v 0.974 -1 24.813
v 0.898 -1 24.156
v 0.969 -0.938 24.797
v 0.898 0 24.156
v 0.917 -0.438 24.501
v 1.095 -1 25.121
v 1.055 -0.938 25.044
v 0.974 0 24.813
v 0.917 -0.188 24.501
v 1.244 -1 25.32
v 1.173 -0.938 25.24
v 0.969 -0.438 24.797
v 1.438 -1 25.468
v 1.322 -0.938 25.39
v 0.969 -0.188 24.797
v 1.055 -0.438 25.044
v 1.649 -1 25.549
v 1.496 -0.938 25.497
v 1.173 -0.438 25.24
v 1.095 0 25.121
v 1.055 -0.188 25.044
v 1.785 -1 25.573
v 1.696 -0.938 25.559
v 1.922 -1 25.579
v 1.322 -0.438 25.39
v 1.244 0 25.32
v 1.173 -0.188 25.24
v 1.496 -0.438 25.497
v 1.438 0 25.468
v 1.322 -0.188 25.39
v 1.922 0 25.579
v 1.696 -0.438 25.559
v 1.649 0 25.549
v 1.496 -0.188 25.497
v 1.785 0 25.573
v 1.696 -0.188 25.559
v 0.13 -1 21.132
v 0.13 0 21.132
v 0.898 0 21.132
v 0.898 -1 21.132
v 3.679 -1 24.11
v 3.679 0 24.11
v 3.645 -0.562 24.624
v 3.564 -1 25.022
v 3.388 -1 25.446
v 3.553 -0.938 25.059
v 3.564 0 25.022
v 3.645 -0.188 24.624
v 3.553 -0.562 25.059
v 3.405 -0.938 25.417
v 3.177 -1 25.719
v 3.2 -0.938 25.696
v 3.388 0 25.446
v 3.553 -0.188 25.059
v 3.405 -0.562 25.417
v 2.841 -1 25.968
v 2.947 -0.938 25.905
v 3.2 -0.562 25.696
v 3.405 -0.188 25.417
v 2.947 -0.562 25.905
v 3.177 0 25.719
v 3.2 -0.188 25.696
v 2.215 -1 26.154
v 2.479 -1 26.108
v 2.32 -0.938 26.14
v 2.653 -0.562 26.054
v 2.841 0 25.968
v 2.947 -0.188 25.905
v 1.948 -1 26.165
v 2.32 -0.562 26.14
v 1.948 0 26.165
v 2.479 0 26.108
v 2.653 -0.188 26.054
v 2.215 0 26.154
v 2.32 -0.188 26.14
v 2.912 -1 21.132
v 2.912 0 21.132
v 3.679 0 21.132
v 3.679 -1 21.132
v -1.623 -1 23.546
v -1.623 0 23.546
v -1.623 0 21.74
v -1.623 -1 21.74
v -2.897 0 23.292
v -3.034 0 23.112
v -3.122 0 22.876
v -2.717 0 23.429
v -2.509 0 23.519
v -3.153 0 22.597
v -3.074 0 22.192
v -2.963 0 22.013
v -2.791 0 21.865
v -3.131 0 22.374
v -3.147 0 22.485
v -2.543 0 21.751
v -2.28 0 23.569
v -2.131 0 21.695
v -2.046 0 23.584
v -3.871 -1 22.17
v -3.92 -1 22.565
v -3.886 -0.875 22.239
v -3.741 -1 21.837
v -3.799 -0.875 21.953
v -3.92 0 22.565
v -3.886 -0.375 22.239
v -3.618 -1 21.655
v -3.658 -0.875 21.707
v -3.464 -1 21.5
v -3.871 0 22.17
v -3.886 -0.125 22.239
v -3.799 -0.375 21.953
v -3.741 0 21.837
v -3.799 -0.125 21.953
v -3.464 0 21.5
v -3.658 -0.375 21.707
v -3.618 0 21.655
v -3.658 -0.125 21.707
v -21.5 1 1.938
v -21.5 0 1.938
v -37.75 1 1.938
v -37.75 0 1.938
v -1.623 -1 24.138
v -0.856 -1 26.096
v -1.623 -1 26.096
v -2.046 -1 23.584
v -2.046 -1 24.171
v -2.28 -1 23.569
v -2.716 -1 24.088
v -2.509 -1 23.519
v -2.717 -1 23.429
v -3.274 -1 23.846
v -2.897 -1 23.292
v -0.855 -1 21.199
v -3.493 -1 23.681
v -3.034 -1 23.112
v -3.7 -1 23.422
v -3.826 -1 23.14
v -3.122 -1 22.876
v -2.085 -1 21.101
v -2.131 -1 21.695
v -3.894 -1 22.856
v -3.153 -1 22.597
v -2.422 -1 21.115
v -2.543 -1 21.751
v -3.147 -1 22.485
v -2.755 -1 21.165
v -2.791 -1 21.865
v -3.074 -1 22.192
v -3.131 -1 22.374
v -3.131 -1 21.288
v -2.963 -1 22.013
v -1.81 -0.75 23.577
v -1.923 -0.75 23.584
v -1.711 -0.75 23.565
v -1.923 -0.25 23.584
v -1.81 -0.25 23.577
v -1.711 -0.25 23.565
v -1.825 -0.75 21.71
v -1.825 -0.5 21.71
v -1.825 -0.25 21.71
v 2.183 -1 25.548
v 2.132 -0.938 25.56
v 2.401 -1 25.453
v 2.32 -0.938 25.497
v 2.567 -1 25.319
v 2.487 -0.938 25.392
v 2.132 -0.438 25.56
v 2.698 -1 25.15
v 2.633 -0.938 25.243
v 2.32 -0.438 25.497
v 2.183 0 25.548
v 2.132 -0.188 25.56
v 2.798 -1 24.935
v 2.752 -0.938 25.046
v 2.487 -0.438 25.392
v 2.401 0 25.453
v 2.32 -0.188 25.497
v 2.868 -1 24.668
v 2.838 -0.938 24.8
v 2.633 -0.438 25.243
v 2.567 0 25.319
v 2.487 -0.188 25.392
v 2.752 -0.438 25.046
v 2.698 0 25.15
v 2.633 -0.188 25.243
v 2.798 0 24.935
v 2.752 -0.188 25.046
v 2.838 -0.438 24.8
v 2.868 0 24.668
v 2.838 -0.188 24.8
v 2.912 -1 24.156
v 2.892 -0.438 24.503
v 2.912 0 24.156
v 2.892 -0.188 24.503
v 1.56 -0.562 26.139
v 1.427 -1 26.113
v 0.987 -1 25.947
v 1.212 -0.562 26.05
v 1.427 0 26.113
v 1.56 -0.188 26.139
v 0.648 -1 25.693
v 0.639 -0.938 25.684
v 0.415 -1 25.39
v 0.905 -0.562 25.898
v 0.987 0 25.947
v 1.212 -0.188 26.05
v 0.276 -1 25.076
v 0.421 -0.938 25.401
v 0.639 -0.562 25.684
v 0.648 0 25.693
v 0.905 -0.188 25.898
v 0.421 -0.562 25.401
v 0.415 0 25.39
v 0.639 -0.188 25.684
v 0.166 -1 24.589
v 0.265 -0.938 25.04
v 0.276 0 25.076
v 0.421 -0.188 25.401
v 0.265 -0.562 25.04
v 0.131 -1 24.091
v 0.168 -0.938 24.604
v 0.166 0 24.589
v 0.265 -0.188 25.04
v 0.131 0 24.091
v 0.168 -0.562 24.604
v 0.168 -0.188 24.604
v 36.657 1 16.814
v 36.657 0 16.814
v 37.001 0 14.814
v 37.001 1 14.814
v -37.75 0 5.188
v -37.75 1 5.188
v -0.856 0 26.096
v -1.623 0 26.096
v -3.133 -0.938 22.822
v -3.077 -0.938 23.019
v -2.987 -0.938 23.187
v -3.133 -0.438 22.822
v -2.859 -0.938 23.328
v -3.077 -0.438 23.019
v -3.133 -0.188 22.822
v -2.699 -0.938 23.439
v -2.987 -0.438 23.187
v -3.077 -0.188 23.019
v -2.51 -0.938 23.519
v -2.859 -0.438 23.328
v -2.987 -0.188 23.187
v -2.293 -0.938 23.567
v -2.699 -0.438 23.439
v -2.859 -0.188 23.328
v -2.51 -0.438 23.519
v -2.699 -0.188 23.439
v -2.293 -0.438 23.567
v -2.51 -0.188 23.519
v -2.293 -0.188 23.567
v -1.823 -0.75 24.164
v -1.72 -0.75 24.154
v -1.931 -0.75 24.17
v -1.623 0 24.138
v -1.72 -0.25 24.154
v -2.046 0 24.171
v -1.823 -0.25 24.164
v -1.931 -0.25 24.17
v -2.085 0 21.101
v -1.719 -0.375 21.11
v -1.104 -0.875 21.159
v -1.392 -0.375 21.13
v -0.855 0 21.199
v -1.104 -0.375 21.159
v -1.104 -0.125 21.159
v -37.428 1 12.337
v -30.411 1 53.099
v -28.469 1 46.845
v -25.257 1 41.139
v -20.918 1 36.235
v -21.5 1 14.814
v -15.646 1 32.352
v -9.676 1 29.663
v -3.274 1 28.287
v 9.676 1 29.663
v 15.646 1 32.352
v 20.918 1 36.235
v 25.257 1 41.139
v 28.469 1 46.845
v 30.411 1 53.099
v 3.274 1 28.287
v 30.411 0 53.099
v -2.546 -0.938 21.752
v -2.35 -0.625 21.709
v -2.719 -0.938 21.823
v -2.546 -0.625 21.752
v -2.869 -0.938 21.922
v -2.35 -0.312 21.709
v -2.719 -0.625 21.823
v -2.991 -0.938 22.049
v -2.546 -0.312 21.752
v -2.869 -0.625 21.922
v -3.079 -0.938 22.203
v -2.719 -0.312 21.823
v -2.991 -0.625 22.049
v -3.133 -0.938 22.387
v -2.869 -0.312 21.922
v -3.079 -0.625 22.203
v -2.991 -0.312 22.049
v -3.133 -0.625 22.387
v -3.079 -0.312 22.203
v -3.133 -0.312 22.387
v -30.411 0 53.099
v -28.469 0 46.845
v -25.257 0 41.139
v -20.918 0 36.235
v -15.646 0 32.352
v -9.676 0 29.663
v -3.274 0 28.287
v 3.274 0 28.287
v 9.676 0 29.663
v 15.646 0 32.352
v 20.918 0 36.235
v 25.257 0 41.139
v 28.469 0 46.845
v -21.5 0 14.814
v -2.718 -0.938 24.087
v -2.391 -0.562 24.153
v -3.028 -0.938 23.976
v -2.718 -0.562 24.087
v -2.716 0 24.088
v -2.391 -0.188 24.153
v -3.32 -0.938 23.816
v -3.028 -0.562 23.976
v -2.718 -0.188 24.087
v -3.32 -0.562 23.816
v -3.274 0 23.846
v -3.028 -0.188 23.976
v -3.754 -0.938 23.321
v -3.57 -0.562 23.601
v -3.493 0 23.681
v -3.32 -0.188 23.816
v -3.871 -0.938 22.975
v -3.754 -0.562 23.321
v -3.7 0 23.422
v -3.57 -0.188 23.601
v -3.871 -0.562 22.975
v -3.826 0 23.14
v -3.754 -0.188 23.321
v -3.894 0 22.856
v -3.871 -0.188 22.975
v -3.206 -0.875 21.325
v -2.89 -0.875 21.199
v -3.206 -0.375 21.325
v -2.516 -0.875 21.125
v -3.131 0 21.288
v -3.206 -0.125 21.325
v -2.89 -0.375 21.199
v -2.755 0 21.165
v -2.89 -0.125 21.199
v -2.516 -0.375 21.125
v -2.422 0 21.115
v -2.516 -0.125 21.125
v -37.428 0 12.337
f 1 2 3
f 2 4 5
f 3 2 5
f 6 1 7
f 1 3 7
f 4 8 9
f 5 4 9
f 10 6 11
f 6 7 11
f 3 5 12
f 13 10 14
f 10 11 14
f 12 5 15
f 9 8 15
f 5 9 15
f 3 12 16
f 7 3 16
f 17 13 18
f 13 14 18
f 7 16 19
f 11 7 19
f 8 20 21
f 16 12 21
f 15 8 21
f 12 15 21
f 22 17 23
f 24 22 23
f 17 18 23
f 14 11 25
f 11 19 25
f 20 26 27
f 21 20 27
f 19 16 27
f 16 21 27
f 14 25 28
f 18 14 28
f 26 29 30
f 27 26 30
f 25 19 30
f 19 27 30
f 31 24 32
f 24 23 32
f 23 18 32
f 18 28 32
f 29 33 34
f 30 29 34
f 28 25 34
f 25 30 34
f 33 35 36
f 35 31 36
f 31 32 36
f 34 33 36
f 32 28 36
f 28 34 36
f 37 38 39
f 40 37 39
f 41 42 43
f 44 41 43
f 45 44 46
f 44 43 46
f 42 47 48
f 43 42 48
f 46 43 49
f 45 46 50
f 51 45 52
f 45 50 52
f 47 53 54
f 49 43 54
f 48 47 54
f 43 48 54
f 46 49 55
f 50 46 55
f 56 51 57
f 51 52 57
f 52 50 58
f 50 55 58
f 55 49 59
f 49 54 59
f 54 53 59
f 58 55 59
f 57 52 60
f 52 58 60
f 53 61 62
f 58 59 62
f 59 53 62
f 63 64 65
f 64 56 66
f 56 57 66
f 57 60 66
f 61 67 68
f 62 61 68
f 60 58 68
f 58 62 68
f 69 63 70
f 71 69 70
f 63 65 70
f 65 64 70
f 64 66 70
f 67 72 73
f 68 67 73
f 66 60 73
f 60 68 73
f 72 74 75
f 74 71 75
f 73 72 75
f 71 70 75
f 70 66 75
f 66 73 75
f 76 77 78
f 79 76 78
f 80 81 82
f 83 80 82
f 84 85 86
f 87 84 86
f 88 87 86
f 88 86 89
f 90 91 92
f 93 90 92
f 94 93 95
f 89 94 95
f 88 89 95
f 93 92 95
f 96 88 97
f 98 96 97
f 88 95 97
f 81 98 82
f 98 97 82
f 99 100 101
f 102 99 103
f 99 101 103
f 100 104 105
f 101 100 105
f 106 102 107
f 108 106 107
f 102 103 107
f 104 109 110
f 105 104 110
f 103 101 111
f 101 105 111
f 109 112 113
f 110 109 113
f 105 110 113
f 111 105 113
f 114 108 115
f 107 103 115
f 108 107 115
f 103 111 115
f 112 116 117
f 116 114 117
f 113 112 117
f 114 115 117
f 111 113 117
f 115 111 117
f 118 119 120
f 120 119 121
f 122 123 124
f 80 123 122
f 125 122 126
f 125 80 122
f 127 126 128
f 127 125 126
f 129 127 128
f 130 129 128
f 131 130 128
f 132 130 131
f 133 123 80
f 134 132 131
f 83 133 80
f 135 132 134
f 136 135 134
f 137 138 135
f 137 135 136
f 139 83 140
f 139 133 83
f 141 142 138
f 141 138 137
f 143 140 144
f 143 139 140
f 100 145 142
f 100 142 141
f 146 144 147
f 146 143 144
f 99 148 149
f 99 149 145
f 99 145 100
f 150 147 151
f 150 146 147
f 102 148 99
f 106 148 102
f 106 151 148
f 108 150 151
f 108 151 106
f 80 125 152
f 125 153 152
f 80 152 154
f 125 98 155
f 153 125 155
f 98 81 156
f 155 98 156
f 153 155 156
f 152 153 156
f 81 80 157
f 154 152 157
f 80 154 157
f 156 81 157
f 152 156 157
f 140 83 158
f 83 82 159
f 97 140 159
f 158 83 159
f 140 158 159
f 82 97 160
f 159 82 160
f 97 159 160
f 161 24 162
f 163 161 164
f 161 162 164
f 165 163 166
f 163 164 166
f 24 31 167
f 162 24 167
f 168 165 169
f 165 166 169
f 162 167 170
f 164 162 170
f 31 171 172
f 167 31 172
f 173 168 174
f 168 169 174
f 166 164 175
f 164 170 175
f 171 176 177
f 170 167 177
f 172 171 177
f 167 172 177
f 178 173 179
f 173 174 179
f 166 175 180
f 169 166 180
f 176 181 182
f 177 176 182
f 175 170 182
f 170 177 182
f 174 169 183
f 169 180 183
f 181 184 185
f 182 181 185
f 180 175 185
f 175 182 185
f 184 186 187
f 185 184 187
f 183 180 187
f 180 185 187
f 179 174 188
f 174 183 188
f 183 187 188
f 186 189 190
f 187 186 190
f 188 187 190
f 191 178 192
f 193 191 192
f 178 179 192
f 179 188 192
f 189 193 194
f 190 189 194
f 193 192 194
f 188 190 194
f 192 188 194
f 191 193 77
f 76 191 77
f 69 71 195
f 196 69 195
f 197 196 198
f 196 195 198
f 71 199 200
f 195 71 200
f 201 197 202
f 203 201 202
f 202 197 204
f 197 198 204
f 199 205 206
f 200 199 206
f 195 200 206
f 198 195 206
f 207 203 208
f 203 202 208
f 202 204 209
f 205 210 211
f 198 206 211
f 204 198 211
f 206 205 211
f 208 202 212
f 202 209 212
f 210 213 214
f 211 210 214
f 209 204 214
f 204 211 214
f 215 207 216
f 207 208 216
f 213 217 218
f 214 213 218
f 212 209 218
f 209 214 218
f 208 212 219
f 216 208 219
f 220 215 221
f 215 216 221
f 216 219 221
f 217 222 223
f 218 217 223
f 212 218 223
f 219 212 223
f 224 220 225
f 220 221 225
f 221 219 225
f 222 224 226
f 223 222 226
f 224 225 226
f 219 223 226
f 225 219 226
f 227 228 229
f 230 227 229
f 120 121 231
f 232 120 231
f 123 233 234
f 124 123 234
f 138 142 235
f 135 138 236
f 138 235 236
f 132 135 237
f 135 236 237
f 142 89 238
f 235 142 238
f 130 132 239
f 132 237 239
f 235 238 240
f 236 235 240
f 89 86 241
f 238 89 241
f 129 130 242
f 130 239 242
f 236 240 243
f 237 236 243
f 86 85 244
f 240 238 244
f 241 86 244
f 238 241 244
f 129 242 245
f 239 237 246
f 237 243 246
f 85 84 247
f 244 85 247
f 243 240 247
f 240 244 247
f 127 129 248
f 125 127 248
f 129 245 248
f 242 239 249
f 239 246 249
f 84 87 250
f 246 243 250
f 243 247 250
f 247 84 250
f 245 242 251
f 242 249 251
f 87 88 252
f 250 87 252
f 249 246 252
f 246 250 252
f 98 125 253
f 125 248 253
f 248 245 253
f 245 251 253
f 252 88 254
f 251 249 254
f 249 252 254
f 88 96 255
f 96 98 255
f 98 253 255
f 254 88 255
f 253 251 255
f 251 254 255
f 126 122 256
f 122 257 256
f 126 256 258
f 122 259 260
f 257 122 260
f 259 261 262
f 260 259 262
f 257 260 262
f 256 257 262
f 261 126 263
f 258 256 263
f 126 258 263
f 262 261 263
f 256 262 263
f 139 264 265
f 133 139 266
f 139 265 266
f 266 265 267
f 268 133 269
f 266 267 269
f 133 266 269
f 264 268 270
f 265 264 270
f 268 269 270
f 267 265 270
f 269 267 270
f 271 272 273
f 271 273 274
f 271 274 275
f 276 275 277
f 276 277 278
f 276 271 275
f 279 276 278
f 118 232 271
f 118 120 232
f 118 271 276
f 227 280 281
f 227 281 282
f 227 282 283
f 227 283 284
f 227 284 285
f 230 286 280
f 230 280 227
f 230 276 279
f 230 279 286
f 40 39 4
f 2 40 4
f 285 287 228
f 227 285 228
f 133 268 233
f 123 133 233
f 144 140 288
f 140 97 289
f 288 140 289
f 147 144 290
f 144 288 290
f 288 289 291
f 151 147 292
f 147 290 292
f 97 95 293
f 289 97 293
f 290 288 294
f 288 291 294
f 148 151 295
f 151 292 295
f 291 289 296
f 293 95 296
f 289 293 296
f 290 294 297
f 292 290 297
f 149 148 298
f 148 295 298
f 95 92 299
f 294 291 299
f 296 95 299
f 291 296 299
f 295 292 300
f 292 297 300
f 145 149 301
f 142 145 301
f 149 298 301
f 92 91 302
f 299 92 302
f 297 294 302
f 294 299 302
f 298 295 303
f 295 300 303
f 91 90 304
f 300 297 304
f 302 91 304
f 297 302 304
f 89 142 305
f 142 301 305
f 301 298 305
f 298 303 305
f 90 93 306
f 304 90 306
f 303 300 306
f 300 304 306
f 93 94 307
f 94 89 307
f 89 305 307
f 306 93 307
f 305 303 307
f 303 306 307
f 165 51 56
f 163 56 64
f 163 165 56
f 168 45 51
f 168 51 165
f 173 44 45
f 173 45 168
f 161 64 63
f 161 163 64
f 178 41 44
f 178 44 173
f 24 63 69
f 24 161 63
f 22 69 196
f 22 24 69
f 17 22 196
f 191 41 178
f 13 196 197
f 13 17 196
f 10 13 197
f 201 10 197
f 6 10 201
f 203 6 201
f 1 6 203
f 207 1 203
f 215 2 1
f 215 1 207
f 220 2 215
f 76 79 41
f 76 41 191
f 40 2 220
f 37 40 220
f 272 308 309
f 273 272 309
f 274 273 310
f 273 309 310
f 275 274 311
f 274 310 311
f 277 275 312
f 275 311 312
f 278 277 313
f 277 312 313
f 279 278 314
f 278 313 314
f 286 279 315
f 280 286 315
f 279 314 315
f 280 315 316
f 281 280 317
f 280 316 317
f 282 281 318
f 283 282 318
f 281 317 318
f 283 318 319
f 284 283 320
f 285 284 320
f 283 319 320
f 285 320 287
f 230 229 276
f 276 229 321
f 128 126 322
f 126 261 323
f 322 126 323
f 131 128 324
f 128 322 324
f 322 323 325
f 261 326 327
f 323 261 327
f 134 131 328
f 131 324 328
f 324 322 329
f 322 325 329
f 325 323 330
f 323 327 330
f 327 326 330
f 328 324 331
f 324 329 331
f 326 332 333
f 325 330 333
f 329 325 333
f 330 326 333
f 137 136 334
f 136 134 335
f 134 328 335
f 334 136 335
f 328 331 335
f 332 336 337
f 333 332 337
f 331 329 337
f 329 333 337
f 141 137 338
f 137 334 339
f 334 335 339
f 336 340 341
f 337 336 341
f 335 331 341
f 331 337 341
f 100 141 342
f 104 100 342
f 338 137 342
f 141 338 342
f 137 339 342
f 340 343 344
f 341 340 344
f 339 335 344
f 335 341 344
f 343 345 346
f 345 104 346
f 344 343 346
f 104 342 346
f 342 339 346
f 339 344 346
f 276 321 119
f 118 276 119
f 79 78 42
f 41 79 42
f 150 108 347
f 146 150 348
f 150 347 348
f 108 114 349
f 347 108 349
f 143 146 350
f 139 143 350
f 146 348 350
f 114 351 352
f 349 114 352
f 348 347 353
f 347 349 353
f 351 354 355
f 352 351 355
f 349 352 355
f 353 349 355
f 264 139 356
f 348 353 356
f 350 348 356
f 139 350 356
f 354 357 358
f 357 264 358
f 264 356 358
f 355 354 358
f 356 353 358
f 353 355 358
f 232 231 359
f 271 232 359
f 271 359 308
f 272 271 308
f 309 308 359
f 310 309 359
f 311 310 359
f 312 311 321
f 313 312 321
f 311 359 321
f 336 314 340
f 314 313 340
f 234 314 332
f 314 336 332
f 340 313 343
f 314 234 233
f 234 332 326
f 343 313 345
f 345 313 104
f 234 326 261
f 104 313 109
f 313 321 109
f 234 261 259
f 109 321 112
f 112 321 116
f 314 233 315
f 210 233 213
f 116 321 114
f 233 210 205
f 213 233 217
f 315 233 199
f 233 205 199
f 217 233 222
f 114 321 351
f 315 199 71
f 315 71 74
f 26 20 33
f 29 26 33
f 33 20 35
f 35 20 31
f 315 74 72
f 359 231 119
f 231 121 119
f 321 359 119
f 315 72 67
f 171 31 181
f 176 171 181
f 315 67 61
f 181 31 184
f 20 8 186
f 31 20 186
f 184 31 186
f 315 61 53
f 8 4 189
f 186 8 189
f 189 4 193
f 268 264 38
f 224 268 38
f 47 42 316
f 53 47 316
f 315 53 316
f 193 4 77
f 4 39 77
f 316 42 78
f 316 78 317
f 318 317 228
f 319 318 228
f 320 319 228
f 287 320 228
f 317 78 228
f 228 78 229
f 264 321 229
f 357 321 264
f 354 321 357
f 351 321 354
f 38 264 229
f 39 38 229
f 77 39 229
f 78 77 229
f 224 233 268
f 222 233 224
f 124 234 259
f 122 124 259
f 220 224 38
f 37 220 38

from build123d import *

# Parameters (mm, degrees)
EXTRUDE_1_DEPTH = 1
EXTRUDE_2_DEPTH = 1


with BuildPart() as part:
    # 草图2 → 凸台-拉伸1 (new body)
    with BuildSketch(Plane(origin=(0, 0, 0), x_dir=(1, 0, 0), z_dir=(0, 1, 0))):
        with BuildLine():
            Line((-37.75, -5.187524662), (-37.427791342, -12.336938121))
            Line((-37.427791342, -12.336938121), (-30.410766277, -53.09868086))
            ThreePointArc((-30.410766277, -53.09868086), (0, -28.114102247), (30.410766277, -53.09868086))
            Line((30.410766277, -53.09868086), (36.657098941, -16.813873157))
            Line((36.657098941, -16.813873157), (37.001393596, -14.813873158))
            Line((37.001393596, -14.813873158), (-21.5, -14.813873158))
            Line((-21.5, -14.813873158), (-21.5, -1.937524662))
            Line((-21.5, -1.937524662), (-37.75, -1.937524662))
            Line((-37.75, -1.937524662), (-37.75, -5.187524662))
        make_face()
    extrude(amount=EXTRUDE_1_DEPTH)

    # 草图3 → 凸台-拉伸2 (add)
    # profile 1 of 2: a face of its own
    with BuildSketch(Plane(origin=(0, 0, 0), x_dir=(1, 0, 0), z_dir=(0, 1, 0))):
        with BuildLine():
            Line((-0.856008306, -26.09621982), (-1.623205137, -26.09621982))
            Line((-1.623205137, -26.09621982), (-1.623205137, -24.137821353))
            add(Edge.make_bspline(
                [(-1.623205137, -24.137821353), (-1.655268125, -24.143514077), (-1.721316296, -24.155240806), (-1.824283839, -24.164783502), (-1.933346323, -24.17076586), (-2.008053511, -24.170657837), (-2.046485638, -24.170602266)],
                knots=[0, 0, 0, 0, 0.918585764, 1.892241272, 2.915691322, 4, 4, 4, 4], degree=3))
            add(Edge.make_bspline(
                [(-2.046485638, -24.170602266), (-2.104785366, -24.170571941), (-2.220025321, -24.170511997), (-2.390487029, -24.154509017), (-2.556692953, -24.12850453), (-2.718324735, -24.089526065), (-2.87582336, -24.039158247), (-3.029314168, -23.977977332), (-3.17798521, -23.903769977), (-3.321131503, -23.818737452), (-3.455836859, -23.720606314), (-3.573248856, -23.603221137), (-3.675029776, -23.4704659), (-3.7579419, -23.320396932), (-3.825592093, -23.154649423), (-3.874729538, -22.972446384), (-3.908442208, -22.774352183), (-3.916101546, -22.636664835), (-3.920068751, -22.565348758)],
                knots=[0, 0, 0, 0, 1.003522523, 1.98364375, 2.944869411, 3.898614004, 4.843729631, 5.790462383, 6.741287792, 7.702146141, 8.655643954, 9.602935836, 10.551034771, 11.527201242, 12.5464735, 13.626777097, 14.770773406, 16, 16, 16, 16], degree=3))
            add(Edge.make_bspline(
                [(-3.920068751, -22.565348758), (-3.917621314, -22.509206105), (-3.912856522, -22.399904758), (-3.888966748, -22.241365875), (-3.851887205, -22.092719231), (-3.802758946, -21.953287322), (-3.736987826, -21.824826369), (-3.660822021, -21.704776101), (-3.569736975, -21.595056691), (-3.499181783, -21.53152241), (-3.46371946, -21.499588924)],
                knots=[0, 0, 0, 0, 1.126595518, 2.193312949, 3.209115705, 4.196248007, 5.151139266, 6.097382339, 7.043709754, 8, 8, 8, 8], degree=3))
            add(Edge.make_bspline(
                [(-3.46371946, -21.499588924), (-3.423819299, -21.467392586), (-3.342763644, -21.401986955), (-3.204758648, -21.32105817), (-3.053205789, -21.252406965), (-2.887562725, -21.19534799), (-2.707183639, -21.152151647), (-2.5123955, -21.123211501), (-2.303575344, -21.103250861), (-2.159600384, -21.101683502), (-2.085223363, -21.100873809)],
                knots=[0, 0, 0, 0, 0.838628006, 1.70364077, 2.610636308, 3.559859354, 4.568055018, 5.643200099, 6.782484425, 8, 8, 8, 8], degree=3))
            add(Edge.make_bspline(
                [(-2.085223363, -21.100873809), (-2.022547246, -21.101999243), (-1.900326605, -21.10419388), (-1.722031706, -21.10963235), (-1.553493577, -21.11799829), (-1.394779498, -21.129605553), (-1.245704987, -21.14233845), (-1.106447222, -21.158428618), (-0.977269579, -21.177092329), (-0.894709866, -21.191984217), (-0.855064406, -21.199135354)],
                knots=[0, 0, 0, 0, 1.217605855, 2.374374404, 3.464660226, 4.494999595, 5.465333604, 6.370582827, 7.217548217, 8, 8, 8, 8], degree=3))
            Line((-0.855064406, -21.199135354), (-0.856008306, -26.09621982))
        make_face()
        with BuildLine():
            add(Edge.make_bspline(
                [(-1.623205137, -21.739832201), (-1.65274721, -21.733999838), (-1.719633086, -21.720794849), (-1.833986924, -21.708704947), (-1.973601931, -21.699443395), (-2.075441396, -21.696669118), (-2.130574845, -21.695167191)],
                knots=[0, 0, 0, 0, 0.708180311, 1.603383121, 2.702528978, 4, 4, 4, 4], degree=3))
            add(Edge.make_bspline(
                [(-2.130574845, -21.695167191), (-2.168073561, -21.695952692), (-2.24132842, -21.697487191), (-2.348460101, -21.707705221), (-2.449759776, -21.725860501), (-2.54572877, -21.750031884), (-2.635478405, -21.782226009), (-2.71969003, -21.821293247), (-2.797963445, -21.867371353), (-2.870093205, -21.92060581), (-2.935949572, -21.979929245), (-2.993080877, -22.047665882), (-3.041017981, -22.122592696), (-3.081384443, -22.203868683), (-3.112473184, -22.292435582), (-3.13480904, -22.388111375), (-3.14923784, -22.490598656), (-3.151639324, -22.56120559), (-3.152872842, -22.597472724)],
                knots=[0, 0, 0, 0, 1.164286524, 2.274468469, 3.33712435, 4.356941393, 5.343590938, 6.292901648, 7.23538906, 8.158502959, 9.072142365, 9.981112688, 10.900594105, 11.827687296, 12.792632354, 13.80775062, 14.873954761, 16, 16, 16, 16], degree=3))
            add(Edge.make_bspline(
                [(-3.152872842, -22.597472724), (-3.151613433, -22.636249876), (-3.149167963, -22.711545774), (-3.13519411, -22.82079109), (-3.111174009, -22.922850983), (-3.079419521, -23.018294919), (-3.038824966, -23.107069292), (-2.988156623, -23.188218343), (-2.928144539, -23.262075146), (-2.860007553, -23.329662929), (-2.783057089, -23.388781734), (-2.699594044, -23.441477416), (-2.608012254, -23.4847832), (-2.509562282, -23.520465241), (-2.404100063, -23.54918737), (-2.291122917, -23.56840422), (-2.171164858, -23.580930403), (-2.088720416, -23.582872542), (-2.046485638, -23.583867464)],
                knots=[0, 0, 0, 0, 1.10647952, 2.148516939, 3.135813804, 4.093347323, 5.013956832, 5.913991464, 6.814877829, 7.723438285, 8.645449828, 9.577866136, 10.534345172, 11.529217628, 12.562346088, 13.648092354, 14.795160789, 16, 16, 16, 16], degree=3))
            add(Edge.make_bspline(
                [(-2.046485638, -23.583867464), (-2.00521482, -23.584412899), (-1.926388911, -23.585454662), (-1.814442024, -23.578443617), (-1.714043734, -23.567445346), (-1.652392814, -23.552941286), (-1.623205137, -23.546074562)],
                knots=[0, 0, 0, 0, 1.161518353, 2.218461969, 3.156558288, 4, 4, 4, 4], degree=3))
            Line((-1.623205137, -23.546074562), (-1.623205137, -21.739832201))
        make_face(mode=Mode.SUBTRACT)
    # profile 2 of 2: a face of its own
    with BuildSketch(Plane(origin=(0, 0, 0), x_dir=(1, 0, 0), z_dir=(0, 1, 0))):
        with BuildLine():
            Line((0.130386434, -21.131914551), (0.897583266, -21.131914551))
            Line((0.897583266, -21.131914551), (0.897583266, -24.155636425))
            add(Edge.make_bspline(
                [(0.897583266, -24.155636425), (0.89929321, -24.215445763), (0.902592367, -24.33084157), (0.915368258, -24.497724176), (0.936829282, -24.652102877), (0.966769663, -24.79430293), (1.005239493, -24.924351911), (1.052260261, -25.041802473), (1.107369405, -25.147128319), (1.170551424, -25.240289062), (1.242373791, -25.321087274), (1.319851887, -25.391822873), (1.404784791, -25.450371121), (1.495300915, -25.499626189), (1.593035117, -25.536183316), (1.69708966, -25.5615439), (1.807291946, -25.577012589), (1.882979468, -25.57854654), (1.921769062, -25.579332685)],
                knots=[0, 0, 0, 0, 1.442558911, 2.783265207, 4.033293762, 5.19797452, 6.283894868, 7.299176403, 8.243481286, 9.144954945, 10.005756174, 10.844503658, 11.66816234, 12.486940923, 13.323278702, 14.176003432, 15.065208066, 16, 16, 16, 16], degree=3))
            add(Edge.make_bspline(
                [(1.921769062, -25.579332685), (1.957725333, -25.578915325), (2.028096046, -25.578098501), (2.130909973, -25.562628358), (2.228129718, -25.535898617), (2.320368479, -25.498795392), (2.40757394, -25.451723675), (2.488940384, -25.393059054), (2.564744704, -25.323401018), (2.635860422, -25.243242907), (2.699760366, -25.150387865), (2.755013907, -25.045271413), (2.802850288, -24.927654795), (2.840414423, -24.797263515), (2.872028446, -24.654713055), (2.894014576, -24.499623904), (2.908368244, -24.332115662), (2.910724859, -24.216299952), (2.911943092, -24.156429928)],
                knots=[0, 0, 0, 0, 0.880869997, 1.723967724, 2.54076827, 3.348096003, 4.15667844, 4.964596865, 5.80091263, 6.676282017, 7.586647838, 8.557371955, 9.582678263, 10.694376867, 11.880403812, 13.160330013, 14.532054847, 16, 16, 16, 16], degree=3))
            Line((2.911943092, -24.156429928), (2.911943092, -21.131914551))
            Line((2.911943092, -21.131914551), (3.679139924, -21.131914551))
            Line((3.679139924, -21.131914551), (3.679139924, -24.109921407))
            add(Edge.make_bspline(
                [(3.679139924, -24.109921407), (3.677188401, -24.198867937), (3.673417448, -24.370740501), (3.648553918, -24.618287645), (3.610391814, -24.846397955), (3.557827499, -25.055163342), (3.491261126, -25.245040827), (3.410030292, -25.415512075), (3.31448028, -25.566466666), (3.203498097, -25.697108223), (3.080569907, -25.809550333), (2.94882349, -25.908176054), (2.805519828, -25.989407969), (2.653202823, -26.056947418), (2.49058693, -26.108131021), (2.318208544, -26.142255886), (2.1365007, -26.164139495), (2.011908047, -26.164790111), (1.948224093, -26.165122665)],
                knots=[0, 0, 0, 0, 1.389947096, 2.68581329, 3.884176986, 5.001519278, 6.046082896, 7.023506491, 7.946473535, 8.830015835, 9.69383004, 10.545329235, 11.396344648, 12.262399475, 13.145009074, 14.054291982, 15.00547603, 16, 16, 16, 16], degree=3))
            add(Edge.make_bspline(
                [(1.948224093, -26.165122665), (1.881721214, -26.164339998), (1.751827834, -26.162811293), (1.561981249, -26.141967577), (1.382440978, -26.104865244), (1.212643091, -26.053613752), (1.053287044, -25.984492529), (0.903741738, -25.900795559), (0.764964905, -25.800213917), (0.635145258, -25.685884953), (0.518115943, -25.552843022), (0.4164162, -25.399939828), (0.330633136, -25.227687461), (0.260185761, -25.036841598), (0.204398311, -24.827427738), (0.164915765, -24.598798774), (0.137702567, -24.351381444), (0.133499992, -24.179812722), (0.131330334, -24.091237172)],
                knots=[0, 0, 0, 0, 1.013962662, 1.980471211, 2.907472823, 3.806985122, 4.680561309, 5.551651082, 6.415505808, 7.289926821, 8.185106327, 9.109702809, 10.082849364, 11.113391155, 12.207519227, 13.383461846, 14.649163417, 16, 16, 16, 16], degree=3))
            Line((0.131330334, -24.091237172), (0.130386434, -21.131914551))
        make_face()
    extrude(amount=-EXTRUDE_2_DEPTH)


solid = part.part
